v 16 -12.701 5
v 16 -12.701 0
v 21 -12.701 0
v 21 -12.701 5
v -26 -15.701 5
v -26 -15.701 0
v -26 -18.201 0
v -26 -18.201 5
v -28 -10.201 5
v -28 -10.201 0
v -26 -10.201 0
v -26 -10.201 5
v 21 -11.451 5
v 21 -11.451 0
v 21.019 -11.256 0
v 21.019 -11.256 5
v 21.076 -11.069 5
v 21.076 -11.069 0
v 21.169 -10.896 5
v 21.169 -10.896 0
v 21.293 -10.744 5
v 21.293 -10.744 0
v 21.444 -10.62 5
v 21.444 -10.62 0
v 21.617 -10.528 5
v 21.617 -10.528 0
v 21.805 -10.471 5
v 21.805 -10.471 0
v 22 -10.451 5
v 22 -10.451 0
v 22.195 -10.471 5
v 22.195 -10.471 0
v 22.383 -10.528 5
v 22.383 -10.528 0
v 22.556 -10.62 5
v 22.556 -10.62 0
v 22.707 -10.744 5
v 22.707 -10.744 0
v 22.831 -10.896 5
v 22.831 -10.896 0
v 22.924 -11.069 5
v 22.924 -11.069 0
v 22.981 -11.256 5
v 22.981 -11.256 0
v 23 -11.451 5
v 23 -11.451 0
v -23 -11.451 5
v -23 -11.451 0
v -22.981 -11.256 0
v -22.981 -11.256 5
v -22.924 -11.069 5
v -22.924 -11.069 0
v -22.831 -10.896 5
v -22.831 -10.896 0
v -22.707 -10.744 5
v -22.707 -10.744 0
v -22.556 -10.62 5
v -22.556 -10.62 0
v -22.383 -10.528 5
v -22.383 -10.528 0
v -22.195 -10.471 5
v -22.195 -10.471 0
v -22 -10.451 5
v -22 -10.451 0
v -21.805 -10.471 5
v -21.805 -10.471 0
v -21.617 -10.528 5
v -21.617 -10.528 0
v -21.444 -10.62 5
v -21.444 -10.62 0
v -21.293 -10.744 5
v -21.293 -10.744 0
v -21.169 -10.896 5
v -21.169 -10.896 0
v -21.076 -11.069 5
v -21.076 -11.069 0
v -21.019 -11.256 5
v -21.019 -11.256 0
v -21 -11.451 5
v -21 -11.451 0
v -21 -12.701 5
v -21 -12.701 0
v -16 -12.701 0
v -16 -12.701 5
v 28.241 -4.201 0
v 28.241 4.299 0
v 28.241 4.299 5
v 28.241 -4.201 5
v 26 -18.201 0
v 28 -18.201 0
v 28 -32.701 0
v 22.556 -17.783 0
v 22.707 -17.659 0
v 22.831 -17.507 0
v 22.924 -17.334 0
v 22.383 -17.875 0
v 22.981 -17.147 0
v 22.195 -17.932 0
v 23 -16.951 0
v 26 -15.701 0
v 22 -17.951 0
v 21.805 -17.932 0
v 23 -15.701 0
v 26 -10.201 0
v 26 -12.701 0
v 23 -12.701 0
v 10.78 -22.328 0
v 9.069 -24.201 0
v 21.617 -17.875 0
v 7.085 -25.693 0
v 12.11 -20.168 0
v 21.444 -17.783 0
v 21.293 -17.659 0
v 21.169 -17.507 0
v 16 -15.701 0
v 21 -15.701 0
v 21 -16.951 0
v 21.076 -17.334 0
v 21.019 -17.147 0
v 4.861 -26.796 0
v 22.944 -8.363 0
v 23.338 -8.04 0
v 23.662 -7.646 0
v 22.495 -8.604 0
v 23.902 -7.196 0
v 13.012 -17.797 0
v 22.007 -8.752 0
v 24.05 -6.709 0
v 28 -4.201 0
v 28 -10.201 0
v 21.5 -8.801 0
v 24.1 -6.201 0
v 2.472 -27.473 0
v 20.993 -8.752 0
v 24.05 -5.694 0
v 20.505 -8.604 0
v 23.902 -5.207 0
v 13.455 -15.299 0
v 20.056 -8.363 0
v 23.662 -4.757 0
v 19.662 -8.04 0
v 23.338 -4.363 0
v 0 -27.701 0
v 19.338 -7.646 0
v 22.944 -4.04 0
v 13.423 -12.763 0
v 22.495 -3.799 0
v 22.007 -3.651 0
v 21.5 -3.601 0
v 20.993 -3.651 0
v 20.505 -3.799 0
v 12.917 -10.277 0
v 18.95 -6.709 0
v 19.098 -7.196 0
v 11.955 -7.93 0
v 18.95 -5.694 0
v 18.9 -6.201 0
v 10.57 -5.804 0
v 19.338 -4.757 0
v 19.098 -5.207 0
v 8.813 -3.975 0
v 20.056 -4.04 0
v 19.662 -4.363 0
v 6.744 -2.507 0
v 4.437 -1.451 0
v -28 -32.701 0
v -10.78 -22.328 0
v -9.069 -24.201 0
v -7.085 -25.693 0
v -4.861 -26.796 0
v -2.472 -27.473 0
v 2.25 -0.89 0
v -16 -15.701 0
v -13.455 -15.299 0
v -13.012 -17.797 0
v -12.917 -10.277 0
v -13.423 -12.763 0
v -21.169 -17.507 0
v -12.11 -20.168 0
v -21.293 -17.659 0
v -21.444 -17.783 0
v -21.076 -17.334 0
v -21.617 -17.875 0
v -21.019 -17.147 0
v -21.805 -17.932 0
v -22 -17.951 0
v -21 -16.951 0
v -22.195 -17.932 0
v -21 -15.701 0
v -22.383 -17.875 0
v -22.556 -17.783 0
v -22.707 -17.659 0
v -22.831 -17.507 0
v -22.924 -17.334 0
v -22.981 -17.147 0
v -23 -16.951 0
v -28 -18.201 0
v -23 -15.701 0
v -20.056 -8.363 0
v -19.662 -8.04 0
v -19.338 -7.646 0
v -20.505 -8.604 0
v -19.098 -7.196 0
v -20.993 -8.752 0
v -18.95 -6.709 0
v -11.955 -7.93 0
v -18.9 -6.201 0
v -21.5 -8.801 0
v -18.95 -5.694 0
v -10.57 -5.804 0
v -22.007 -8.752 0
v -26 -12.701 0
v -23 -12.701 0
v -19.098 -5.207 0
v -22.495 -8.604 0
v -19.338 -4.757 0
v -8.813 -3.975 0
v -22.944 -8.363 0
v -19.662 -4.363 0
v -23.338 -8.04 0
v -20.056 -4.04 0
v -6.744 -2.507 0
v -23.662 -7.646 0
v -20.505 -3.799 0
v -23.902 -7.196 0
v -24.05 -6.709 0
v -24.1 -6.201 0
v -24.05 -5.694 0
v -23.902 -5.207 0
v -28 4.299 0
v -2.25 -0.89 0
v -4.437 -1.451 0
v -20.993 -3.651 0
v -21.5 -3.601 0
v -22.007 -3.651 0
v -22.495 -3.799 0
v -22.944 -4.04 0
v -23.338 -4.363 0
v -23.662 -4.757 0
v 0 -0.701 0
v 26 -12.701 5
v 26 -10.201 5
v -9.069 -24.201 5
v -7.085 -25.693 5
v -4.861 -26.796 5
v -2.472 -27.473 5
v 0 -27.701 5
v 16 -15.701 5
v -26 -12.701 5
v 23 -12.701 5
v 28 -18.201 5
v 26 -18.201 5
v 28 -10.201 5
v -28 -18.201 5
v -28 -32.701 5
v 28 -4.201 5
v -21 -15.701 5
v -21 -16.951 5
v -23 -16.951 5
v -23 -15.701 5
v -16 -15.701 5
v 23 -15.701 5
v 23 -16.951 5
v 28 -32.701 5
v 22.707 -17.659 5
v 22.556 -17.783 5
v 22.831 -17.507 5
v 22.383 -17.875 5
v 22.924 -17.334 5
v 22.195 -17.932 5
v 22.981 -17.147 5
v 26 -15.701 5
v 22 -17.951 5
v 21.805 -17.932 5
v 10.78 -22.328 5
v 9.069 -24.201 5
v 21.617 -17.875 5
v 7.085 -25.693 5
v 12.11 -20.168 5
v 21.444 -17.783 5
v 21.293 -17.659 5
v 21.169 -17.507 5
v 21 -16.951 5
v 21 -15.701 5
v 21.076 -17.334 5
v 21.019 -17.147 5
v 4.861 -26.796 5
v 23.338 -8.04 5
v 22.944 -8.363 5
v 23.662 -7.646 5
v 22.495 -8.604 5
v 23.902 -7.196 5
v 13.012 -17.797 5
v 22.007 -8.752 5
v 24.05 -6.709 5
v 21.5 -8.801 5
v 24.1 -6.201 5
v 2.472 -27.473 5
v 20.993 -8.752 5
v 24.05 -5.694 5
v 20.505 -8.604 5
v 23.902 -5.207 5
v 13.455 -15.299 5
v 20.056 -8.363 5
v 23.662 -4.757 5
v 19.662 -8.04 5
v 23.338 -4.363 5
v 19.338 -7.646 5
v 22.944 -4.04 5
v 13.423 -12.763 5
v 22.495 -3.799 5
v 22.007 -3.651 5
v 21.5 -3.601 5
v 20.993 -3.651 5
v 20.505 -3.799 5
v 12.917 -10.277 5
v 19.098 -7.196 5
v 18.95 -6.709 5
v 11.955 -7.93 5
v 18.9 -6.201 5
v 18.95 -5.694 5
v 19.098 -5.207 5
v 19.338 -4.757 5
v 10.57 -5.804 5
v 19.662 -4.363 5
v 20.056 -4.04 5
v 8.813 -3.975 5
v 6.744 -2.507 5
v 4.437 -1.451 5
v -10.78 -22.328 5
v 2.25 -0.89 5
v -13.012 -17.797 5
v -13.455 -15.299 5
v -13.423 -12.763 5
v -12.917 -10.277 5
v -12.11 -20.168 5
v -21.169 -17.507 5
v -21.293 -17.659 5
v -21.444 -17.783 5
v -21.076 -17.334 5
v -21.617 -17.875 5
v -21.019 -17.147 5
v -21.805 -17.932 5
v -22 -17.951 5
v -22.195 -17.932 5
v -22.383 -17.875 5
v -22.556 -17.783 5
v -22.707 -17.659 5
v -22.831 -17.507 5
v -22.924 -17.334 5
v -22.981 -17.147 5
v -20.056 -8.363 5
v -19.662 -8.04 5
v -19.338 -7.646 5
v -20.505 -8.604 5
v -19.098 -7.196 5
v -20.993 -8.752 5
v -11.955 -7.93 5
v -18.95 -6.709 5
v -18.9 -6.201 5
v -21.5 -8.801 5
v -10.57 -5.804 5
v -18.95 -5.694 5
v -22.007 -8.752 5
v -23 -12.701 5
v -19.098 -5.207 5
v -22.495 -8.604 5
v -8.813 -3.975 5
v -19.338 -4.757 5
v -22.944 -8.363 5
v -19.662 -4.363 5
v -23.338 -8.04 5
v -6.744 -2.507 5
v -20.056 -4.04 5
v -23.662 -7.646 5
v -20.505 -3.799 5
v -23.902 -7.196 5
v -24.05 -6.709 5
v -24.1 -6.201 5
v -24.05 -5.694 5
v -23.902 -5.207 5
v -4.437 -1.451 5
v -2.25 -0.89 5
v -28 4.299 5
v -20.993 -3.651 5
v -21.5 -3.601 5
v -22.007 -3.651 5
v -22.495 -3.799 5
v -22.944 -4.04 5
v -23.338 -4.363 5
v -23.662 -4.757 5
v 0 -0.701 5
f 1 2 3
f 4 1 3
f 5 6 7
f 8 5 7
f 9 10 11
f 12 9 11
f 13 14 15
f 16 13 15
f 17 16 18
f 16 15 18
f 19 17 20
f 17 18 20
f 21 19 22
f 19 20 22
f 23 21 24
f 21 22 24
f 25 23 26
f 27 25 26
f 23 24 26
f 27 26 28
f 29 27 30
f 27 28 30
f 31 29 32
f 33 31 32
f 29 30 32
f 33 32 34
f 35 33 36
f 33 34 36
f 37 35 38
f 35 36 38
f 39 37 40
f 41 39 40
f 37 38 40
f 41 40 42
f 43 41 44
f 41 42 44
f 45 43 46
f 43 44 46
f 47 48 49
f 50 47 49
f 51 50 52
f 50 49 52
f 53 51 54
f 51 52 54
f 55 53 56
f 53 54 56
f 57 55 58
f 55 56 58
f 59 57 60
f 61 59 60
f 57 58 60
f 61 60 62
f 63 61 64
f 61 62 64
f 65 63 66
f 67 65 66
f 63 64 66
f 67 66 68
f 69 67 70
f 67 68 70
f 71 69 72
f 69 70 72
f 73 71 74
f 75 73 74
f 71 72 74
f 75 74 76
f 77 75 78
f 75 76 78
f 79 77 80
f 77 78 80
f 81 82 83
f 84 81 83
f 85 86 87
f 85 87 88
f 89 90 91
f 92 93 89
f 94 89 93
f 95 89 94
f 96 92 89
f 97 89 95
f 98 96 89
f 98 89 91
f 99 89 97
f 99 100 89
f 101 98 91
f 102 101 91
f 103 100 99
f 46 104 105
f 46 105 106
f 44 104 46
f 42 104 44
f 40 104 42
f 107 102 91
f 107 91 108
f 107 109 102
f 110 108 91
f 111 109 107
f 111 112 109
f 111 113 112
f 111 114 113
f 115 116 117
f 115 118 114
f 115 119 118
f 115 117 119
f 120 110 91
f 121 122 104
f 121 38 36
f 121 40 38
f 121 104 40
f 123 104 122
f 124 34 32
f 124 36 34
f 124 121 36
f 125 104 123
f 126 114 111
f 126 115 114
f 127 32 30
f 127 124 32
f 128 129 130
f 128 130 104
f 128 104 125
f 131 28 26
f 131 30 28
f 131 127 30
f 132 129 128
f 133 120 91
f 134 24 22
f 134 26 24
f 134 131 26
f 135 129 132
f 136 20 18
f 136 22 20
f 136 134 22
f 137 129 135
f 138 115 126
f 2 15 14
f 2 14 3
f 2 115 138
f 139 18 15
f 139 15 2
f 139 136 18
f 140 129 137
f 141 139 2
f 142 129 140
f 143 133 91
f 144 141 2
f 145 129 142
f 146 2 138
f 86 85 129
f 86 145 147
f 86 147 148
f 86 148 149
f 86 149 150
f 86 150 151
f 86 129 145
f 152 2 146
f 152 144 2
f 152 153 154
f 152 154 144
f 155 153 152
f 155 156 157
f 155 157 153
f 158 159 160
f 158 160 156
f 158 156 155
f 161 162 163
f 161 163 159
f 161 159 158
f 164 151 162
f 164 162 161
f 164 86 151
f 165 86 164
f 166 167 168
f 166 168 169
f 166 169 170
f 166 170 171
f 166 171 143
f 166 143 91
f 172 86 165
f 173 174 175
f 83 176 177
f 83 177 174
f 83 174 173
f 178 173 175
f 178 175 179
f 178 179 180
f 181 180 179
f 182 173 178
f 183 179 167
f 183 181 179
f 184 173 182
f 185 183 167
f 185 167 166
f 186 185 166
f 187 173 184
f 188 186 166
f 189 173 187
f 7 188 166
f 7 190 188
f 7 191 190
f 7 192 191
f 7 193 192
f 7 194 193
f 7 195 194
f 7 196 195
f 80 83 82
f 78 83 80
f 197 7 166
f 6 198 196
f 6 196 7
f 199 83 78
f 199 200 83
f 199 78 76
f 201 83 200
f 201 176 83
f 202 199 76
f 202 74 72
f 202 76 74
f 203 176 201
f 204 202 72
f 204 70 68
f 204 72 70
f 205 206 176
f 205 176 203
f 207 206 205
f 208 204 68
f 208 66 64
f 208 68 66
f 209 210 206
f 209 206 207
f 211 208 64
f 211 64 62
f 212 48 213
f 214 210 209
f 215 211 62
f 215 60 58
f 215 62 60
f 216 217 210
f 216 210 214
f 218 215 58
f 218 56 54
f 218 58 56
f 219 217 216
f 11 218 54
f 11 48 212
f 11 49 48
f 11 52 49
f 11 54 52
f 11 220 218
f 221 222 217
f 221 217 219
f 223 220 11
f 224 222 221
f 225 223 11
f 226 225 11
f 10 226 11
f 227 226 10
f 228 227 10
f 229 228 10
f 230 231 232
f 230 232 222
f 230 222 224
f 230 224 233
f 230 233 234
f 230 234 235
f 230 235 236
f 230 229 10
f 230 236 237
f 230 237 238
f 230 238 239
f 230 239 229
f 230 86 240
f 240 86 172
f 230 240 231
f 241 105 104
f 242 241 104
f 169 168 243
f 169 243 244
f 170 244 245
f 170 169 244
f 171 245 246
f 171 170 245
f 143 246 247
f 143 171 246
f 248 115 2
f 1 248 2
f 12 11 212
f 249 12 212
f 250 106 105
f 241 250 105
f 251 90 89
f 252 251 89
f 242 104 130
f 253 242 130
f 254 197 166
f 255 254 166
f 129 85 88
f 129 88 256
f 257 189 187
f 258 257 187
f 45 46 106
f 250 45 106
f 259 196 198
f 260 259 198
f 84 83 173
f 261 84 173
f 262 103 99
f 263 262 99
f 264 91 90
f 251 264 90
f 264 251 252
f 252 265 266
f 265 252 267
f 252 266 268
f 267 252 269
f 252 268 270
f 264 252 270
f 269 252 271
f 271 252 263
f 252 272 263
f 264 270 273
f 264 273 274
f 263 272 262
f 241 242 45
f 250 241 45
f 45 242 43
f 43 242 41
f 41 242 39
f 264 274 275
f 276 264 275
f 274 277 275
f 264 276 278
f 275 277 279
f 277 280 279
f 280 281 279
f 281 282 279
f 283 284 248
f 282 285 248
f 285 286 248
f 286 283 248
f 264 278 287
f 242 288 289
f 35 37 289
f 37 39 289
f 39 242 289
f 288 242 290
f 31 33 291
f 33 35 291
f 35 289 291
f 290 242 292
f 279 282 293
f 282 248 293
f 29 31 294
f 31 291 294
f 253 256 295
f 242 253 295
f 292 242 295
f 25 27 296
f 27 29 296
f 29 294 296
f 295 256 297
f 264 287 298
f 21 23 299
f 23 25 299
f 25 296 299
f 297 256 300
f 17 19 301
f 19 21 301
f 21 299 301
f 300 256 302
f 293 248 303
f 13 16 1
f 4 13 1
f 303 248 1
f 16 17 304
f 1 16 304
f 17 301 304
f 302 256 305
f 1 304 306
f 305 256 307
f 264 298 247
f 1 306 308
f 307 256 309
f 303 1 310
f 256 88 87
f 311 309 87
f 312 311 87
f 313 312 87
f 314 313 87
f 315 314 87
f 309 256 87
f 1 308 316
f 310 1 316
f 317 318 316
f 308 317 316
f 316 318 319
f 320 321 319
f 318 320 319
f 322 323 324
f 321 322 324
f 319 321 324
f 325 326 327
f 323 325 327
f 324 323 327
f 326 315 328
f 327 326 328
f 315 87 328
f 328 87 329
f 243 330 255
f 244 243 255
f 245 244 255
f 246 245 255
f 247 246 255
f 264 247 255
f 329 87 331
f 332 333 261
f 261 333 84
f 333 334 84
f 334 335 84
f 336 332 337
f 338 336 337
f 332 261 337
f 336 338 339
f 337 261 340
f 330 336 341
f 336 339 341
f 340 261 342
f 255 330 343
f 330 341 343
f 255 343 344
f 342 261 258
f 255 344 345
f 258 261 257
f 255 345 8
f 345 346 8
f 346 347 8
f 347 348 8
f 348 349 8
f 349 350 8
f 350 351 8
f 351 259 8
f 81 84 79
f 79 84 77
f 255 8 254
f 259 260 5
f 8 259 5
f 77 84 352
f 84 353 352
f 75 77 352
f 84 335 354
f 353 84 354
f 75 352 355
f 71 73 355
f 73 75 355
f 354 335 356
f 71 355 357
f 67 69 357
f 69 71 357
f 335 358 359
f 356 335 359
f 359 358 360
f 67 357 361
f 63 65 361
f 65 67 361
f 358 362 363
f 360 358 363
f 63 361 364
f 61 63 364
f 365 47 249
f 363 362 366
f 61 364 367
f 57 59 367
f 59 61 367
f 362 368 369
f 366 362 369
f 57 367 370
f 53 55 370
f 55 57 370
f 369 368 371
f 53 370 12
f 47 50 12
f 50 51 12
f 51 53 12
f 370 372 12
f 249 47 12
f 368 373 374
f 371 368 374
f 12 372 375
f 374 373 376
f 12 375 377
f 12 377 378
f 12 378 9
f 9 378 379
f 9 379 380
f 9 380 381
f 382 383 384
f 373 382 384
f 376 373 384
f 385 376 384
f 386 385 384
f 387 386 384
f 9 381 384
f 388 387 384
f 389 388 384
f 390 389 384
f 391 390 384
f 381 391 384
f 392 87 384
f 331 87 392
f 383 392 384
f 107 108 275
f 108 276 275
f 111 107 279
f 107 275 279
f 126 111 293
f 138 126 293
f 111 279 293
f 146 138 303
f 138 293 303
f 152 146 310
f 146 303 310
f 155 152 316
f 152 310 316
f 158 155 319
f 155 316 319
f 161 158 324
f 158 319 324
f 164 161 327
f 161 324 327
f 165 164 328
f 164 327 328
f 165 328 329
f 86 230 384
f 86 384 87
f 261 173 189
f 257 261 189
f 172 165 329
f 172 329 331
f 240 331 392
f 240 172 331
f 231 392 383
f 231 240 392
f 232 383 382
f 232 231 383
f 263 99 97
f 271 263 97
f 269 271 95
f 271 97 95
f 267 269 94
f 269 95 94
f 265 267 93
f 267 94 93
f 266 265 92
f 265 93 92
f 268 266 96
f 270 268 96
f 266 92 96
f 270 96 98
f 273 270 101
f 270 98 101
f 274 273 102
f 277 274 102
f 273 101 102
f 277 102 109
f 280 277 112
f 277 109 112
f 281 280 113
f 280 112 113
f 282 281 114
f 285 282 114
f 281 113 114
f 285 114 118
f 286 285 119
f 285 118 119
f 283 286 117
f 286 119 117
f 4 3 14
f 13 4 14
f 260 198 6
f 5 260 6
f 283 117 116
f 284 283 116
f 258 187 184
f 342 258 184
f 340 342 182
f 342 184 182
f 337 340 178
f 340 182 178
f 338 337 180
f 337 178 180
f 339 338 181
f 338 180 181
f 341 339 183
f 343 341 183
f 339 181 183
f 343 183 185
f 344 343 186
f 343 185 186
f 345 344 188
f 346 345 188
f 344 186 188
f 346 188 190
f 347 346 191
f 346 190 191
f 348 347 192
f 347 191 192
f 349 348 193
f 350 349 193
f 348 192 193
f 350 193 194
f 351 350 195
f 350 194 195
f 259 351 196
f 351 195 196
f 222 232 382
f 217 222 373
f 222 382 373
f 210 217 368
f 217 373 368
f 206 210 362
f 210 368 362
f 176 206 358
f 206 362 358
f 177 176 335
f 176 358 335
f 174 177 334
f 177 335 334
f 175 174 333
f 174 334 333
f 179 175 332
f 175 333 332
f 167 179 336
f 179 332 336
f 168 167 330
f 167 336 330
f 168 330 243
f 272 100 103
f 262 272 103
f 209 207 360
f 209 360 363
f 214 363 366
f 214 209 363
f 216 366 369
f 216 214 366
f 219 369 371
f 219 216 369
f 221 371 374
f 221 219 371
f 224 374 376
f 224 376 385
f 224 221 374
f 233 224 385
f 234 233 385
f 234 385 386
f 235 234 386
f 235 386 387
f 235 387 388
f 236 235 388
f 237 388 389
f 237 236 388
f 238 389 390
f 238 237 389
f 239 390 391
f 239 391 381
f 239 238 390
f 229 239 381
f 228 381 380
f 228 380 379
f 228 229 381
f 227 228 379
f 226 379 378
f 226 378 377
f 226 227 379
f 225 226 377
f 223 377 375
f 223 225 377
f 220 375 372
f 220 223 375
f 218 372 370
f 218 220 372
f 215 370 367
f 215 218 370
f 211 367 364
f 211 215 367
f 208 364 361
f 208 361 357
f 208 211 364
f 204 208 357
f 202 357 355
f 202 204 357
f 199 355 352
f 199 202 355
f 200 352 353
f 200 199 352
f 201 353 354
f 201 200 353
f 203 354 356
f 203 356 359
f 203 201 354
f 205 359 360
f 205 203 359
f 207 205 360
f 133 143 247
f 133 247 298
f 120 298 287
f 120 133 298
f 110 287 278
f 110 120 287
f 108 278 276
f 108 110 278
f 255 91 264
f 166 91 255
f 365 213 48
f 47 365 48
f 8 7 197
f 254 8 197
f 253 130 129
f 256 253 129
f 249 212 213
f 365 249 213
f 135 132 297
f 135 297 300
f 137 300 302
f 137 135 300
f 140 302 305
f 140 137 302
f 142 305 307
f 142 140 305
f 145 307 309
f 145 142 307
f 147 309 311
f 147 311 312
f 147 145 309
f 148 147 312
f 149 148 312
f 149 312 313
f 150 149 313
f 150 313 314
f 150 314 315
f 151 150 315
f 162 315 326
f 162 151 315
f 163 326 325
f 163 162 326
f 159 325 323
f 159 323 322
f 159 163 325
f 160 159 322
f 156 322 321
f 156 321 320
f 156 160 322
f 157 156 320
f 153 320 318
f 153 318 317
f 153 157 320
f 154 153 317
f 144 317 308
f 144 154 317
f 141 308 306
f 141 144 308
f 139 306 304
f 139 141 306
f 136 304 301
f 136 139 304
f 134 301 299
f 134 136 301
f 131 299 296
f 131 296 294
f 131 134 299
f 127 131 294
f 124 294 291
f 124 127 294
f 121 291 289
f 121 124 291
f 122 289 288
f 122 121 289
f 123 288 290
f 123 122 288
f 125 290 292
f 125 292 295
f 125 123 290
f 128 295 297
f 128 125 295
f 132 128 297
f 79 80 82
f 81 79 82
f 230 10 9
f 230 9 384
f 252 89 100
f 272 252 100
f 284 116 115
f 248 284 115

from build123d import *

# Parameters (mm, degrees)
SKETCH1_R           = 2.6
BOSS_EXTRUDE1_DEPTH = 5
SKETCH2_W           = 69.749863317
SKETCH2_H           = 53.464567198
SKETCH2_W_2         = 56
SKETCH2_H_2         = 33
SKETCH2_R           = 13.5
CUT_EXTRUDE1_DEPTH  = 10
BOSS_EXTRUDE2_DEPTH = 5


with BuildPart() as part:
    # Sketch1 → Boss-Extrude1 (new body)
    with BuildSketch(Plane.XY):
        with BuildLine():
            Line((-28, -18.201493875), (-28, -24.201493875))
            Line((-28, -24.201493875), (28, -24.201493875))
            Line((28, -24.201493875), (28, -18.201493875))
            Line((28, -18.201493875), (26, -18.201493875))
            Line((26, -18.201493875), (26, -15.701493875))
            Line((26, -15.701493875), (23, -15.701493875))
            Line((23, -15.701493875), (23, -16.951493875))
            ThreePointArc((23, -16.951493875), (22, -17.951493875), (21, -16.951493875))
            Line((21, -16.951493875), (21, -15.701493875))
            Line((21, -15.701493875), (16, -15.701493875))
            Line((16, -15.701493875), (16, -12.701493875))
            Line((16, -12.701493875), (21, -12.701493875))
            Line((21, -12.701493875), (21, -11.451493875))
            ThreePointArc((21, -11.451493875), (22, -10.451493875), (23, -11.451493875))
            Line((23, -11.451493875), (23, -12.701493875))
            Line((23, -12.701493875), (26, -12.701493875))
            Line((26, -12.701493875), (26, -10.201493875))
            Line((26, -10.201493875), (28, -10.201493875))
            Line((28, -10.201493875), (28, -4.201493875))
            Line((28, -4.201493875), (26, -4.201493875))
            Line((26, -4.201493875), (26, 2.924352213))
            Line((26, 2.924352213), (12, 17.426918513))
            Line((12, 17.426918513), (-12, 17.426918513))
            Line((-12, 17.426918513), (-26, 2.924352213))
            Line((-26, 2.924352213), (-26, -4.201493875))
            Line((-26, -4.201493875), (-28, -4.201493875))
            Line((-28, -4.201493875), (-28, -10.201493875))
            Line((-28, -10.201493875), (-26, -10.201493875))
            Line((-26, -10.201493875), (-26, -12.701493875))
            Line((-26, -12.701493875), (-23, -12.701493875))
            Line((-23, -12.701493875), (-23, -11.451493875))
            ThreePointArc((-23, -11.451493875), (-22, -10.451493875), (-21, -11.451493875))
            Line((-21, -11.451493875), (-21, -12.701493875))
            Line((-21, -12.701493875), (-16, -12.701493875))
            Line((-16, -12.701493875), (-16, -15.701493875))
            Line((-16, -15.701493875), (-21, -15.701493875))
            Line((-21, -15.701493875), (-21, -16.951493875))
            ThreePointArc((-21, -16.951493875), (-22, -17.951493875), (-23, -16.951493875))
            Line((-23, -16.951493875), (-23, -15.701493875))
            Line((-23, -15.701493875), (-26, -15.701493875))
            Line((-26, -15.701493875), (-26, -18.201493875))
            Line((-26, -18.201493875), (-28, -18.201493875))
        make_face()
        with Locations((-21.5, -6.201493875)):
            Circle(SKETCH1_R, mode=Mode.SUBTRACT)
        with Locations((21.5, -6.201493875)):
            Circle(SKETCH1_R, mode=Mode.SUBTRACT)
        with BuildLine():
            Line((8.25, 3.201632482), (8.25, -1.451493875))
            Line((8.25, -1.451493875), (3.596873642, -1.451493875))
            ThreePointArc((3.596873642, -1.451493875), (0, -2.201493875), (-3.596873642, -1.451493875))
            Line((-3.596873642, -1.451493875), (-8.25, -1.451493875))
            Line((-8.25, -1.451493875), (-8.25, 3.201632482))
            ThreePointArc((-8.25, 3.201632482), (-8.626766656, 4.233570052), (-8.875, 5.303723532))
            ThreePointArc((-8.875, 5.303723532), (-10.25, 6.798506125), (-8.875, 8.293288717))
            ThreePointArc((-8.875, 8.293288717), (-8.626766656, 9.363442197), (-8.25, 10.395379767))
            Line((-8.25, 10.395379767), (-8.25, 15.048506125))
            Line((-8.25, 15.048506125), (-3.596873642, 15.048506125))
            ThreePointArc((-3.596873642, 15.048506125), (0, 15.798506125), (3.596873642, 15.048506125))
            Line((3.596873642, 15.048506125), (8.25, 15.048506125))
            Line((8.25, 15.048506125), (8.25, 10.395379767))
            ThreePointArc((8.25, 10.395379767), (8.626766656, 9.363442197), (8.875, 8.293288717))
            ThreePointArc((8.875, 8.293288717), (10.25, 6.798506125), (8.875, 5.303723532))
            ThreePointArc((8.875, 5.303723532), (8.626766656, 4.233570052), (8.25, 3.201632482))
        make_face(mode=Mode.SUBTRACT)
    extrude(amount=BOSS_EXTRUDE1_DEPTH)

    # Sketch2 → Cut-Extrude1 (cut)
    # profile 1 of 2: a face of its own
    with BuildSketch(Plane.XY.offset(5)):
        with Locations((5.197554668, -6.913421349)):
            Rectangle(SKETCH2_W, SKETCH2_H)
        with Locations((0, -14.201493875)):
            Rectangle(SKETCH2_W_2, SKETCH2_H_2, mode=Mode.SUBTRACT)
    # profile 2 of 2: a face of its own
    with BuildSketch(Plane.XY.offset(5)):
        with Locations((0, -14.201493875)):
            Circle(SKETCH2_R)
    extrude(amount=-CUT_EXTRUDE1_DEPTH, mode=Mode.SUBTRACT)


with BuildPart() as cut_extrude1_piece_1:
    # of the separate pieces the step leaves, piece 1, a body of its own (cut_extrude1_pieces)
    add(part.part.solids().sort_by_distance((9.069178574, -24.201493875, 0))[0])



with BuildPart() as cut_extrude1_piece_2:
    # of the separate pieces the step leaves, piece 2, a body of its own (cut_extrude1_pieces)
    add(part.part.solids().sort_by_distance((-28, -18.201493875, 0))[0])


with BuildPart() as cut_extrude1_piece_1_1:
    add(cut_extrude1_piece_1.part)

    add(cut_extrude1_piece_2.part)  # Boss-Extrude2 merges Cut-Extrude1 piece 2
    # Sketch3 → Boss-Extrude2 (add)
    with BuildSketch(Plane(origin=(0, 0, 0), x_dir=(-1, 0, 0), z_dir=(0, 0, -1))):
        with BuildLine():
            Line((-26, -4.201493875), (-26, -0.701493875))
            Line((-26, -0.701493875), (-26, 2.298506125))
            Line((-26, 2.298506125), (-8.25, 2.298506125))
            Line((-8.25, 2.298506125), (-8.25, -0.701493875))
            Line((-8.25, -0.701493875), (-8.25, -1.451493875))
            Line((-8.25, -1.451493875), (-4.437059837, -1.451493875))
            ThreePointArc((-4.437059837, -1.451493875), (2.167902598, -0.876697505), (8.25, -3.515638739))
            Line((8.25, -3.515638739), (8.25, -0.701493875))
            Line((8.25, -0.701493875), (26, -0.701493875))
            Line((26, -0.701493875), (26, -4.201493875))
            Line((26, -4.201493875), (28, -4.201493875))
            Line((28, -4.201493875), (28, -0.701493875))
            Line((28, -0.701493875), (28, 4.298506125))
            Line((28, 4.298506125), (-28.241259843, 4.298506125))
            Line((-28.241259843, 4.298506125), (-28.241259843, -0.701493875))
            Line((-28.241259843, -0.701493875), (-28.241259843, -4.201493875))
            Line((-28.241259843, -4.201493875), (-28, -4.201493875))
            Line((-28, -4.201493875), (-26, -4.201493875))
        make_face()
        Polygon((28, -27.701493875), (0, -27.701493875), (-28, -27.701493875), (-28, -32.701493875), (28, -32.701493875), align=None)
        with BuildLine():
            Line((28, -24.201493875), (9.069178574, -24.201493875))
            ThreePointArc((9.069178574, -24.201493875), (4.860555524, -26.796135593), (0, -27.701493875))
            Line((0, -27.701493875), (28, -27.701493875))
            Line((28, -27.701493875), (28, -24.201493875))
        make_face()
        with BuildLine():
            ThreePointArc((0, -27.701493875), (-4.860555524, -26.796135593), (-9.069178574, -24.201493875))
            Line((-9.069178574, -24.201493875), (-28, -24.201493875))
            Line((-28, -24.201493875), (-28, -27.701493875))
            Line((-28, -27.701493875), (0, -27.701493875))
        make_face()
    extrude(amount=-BOSS_EXTRUDE2_DEPTH)


solid = cut_extrude1_piece_1_1.part
